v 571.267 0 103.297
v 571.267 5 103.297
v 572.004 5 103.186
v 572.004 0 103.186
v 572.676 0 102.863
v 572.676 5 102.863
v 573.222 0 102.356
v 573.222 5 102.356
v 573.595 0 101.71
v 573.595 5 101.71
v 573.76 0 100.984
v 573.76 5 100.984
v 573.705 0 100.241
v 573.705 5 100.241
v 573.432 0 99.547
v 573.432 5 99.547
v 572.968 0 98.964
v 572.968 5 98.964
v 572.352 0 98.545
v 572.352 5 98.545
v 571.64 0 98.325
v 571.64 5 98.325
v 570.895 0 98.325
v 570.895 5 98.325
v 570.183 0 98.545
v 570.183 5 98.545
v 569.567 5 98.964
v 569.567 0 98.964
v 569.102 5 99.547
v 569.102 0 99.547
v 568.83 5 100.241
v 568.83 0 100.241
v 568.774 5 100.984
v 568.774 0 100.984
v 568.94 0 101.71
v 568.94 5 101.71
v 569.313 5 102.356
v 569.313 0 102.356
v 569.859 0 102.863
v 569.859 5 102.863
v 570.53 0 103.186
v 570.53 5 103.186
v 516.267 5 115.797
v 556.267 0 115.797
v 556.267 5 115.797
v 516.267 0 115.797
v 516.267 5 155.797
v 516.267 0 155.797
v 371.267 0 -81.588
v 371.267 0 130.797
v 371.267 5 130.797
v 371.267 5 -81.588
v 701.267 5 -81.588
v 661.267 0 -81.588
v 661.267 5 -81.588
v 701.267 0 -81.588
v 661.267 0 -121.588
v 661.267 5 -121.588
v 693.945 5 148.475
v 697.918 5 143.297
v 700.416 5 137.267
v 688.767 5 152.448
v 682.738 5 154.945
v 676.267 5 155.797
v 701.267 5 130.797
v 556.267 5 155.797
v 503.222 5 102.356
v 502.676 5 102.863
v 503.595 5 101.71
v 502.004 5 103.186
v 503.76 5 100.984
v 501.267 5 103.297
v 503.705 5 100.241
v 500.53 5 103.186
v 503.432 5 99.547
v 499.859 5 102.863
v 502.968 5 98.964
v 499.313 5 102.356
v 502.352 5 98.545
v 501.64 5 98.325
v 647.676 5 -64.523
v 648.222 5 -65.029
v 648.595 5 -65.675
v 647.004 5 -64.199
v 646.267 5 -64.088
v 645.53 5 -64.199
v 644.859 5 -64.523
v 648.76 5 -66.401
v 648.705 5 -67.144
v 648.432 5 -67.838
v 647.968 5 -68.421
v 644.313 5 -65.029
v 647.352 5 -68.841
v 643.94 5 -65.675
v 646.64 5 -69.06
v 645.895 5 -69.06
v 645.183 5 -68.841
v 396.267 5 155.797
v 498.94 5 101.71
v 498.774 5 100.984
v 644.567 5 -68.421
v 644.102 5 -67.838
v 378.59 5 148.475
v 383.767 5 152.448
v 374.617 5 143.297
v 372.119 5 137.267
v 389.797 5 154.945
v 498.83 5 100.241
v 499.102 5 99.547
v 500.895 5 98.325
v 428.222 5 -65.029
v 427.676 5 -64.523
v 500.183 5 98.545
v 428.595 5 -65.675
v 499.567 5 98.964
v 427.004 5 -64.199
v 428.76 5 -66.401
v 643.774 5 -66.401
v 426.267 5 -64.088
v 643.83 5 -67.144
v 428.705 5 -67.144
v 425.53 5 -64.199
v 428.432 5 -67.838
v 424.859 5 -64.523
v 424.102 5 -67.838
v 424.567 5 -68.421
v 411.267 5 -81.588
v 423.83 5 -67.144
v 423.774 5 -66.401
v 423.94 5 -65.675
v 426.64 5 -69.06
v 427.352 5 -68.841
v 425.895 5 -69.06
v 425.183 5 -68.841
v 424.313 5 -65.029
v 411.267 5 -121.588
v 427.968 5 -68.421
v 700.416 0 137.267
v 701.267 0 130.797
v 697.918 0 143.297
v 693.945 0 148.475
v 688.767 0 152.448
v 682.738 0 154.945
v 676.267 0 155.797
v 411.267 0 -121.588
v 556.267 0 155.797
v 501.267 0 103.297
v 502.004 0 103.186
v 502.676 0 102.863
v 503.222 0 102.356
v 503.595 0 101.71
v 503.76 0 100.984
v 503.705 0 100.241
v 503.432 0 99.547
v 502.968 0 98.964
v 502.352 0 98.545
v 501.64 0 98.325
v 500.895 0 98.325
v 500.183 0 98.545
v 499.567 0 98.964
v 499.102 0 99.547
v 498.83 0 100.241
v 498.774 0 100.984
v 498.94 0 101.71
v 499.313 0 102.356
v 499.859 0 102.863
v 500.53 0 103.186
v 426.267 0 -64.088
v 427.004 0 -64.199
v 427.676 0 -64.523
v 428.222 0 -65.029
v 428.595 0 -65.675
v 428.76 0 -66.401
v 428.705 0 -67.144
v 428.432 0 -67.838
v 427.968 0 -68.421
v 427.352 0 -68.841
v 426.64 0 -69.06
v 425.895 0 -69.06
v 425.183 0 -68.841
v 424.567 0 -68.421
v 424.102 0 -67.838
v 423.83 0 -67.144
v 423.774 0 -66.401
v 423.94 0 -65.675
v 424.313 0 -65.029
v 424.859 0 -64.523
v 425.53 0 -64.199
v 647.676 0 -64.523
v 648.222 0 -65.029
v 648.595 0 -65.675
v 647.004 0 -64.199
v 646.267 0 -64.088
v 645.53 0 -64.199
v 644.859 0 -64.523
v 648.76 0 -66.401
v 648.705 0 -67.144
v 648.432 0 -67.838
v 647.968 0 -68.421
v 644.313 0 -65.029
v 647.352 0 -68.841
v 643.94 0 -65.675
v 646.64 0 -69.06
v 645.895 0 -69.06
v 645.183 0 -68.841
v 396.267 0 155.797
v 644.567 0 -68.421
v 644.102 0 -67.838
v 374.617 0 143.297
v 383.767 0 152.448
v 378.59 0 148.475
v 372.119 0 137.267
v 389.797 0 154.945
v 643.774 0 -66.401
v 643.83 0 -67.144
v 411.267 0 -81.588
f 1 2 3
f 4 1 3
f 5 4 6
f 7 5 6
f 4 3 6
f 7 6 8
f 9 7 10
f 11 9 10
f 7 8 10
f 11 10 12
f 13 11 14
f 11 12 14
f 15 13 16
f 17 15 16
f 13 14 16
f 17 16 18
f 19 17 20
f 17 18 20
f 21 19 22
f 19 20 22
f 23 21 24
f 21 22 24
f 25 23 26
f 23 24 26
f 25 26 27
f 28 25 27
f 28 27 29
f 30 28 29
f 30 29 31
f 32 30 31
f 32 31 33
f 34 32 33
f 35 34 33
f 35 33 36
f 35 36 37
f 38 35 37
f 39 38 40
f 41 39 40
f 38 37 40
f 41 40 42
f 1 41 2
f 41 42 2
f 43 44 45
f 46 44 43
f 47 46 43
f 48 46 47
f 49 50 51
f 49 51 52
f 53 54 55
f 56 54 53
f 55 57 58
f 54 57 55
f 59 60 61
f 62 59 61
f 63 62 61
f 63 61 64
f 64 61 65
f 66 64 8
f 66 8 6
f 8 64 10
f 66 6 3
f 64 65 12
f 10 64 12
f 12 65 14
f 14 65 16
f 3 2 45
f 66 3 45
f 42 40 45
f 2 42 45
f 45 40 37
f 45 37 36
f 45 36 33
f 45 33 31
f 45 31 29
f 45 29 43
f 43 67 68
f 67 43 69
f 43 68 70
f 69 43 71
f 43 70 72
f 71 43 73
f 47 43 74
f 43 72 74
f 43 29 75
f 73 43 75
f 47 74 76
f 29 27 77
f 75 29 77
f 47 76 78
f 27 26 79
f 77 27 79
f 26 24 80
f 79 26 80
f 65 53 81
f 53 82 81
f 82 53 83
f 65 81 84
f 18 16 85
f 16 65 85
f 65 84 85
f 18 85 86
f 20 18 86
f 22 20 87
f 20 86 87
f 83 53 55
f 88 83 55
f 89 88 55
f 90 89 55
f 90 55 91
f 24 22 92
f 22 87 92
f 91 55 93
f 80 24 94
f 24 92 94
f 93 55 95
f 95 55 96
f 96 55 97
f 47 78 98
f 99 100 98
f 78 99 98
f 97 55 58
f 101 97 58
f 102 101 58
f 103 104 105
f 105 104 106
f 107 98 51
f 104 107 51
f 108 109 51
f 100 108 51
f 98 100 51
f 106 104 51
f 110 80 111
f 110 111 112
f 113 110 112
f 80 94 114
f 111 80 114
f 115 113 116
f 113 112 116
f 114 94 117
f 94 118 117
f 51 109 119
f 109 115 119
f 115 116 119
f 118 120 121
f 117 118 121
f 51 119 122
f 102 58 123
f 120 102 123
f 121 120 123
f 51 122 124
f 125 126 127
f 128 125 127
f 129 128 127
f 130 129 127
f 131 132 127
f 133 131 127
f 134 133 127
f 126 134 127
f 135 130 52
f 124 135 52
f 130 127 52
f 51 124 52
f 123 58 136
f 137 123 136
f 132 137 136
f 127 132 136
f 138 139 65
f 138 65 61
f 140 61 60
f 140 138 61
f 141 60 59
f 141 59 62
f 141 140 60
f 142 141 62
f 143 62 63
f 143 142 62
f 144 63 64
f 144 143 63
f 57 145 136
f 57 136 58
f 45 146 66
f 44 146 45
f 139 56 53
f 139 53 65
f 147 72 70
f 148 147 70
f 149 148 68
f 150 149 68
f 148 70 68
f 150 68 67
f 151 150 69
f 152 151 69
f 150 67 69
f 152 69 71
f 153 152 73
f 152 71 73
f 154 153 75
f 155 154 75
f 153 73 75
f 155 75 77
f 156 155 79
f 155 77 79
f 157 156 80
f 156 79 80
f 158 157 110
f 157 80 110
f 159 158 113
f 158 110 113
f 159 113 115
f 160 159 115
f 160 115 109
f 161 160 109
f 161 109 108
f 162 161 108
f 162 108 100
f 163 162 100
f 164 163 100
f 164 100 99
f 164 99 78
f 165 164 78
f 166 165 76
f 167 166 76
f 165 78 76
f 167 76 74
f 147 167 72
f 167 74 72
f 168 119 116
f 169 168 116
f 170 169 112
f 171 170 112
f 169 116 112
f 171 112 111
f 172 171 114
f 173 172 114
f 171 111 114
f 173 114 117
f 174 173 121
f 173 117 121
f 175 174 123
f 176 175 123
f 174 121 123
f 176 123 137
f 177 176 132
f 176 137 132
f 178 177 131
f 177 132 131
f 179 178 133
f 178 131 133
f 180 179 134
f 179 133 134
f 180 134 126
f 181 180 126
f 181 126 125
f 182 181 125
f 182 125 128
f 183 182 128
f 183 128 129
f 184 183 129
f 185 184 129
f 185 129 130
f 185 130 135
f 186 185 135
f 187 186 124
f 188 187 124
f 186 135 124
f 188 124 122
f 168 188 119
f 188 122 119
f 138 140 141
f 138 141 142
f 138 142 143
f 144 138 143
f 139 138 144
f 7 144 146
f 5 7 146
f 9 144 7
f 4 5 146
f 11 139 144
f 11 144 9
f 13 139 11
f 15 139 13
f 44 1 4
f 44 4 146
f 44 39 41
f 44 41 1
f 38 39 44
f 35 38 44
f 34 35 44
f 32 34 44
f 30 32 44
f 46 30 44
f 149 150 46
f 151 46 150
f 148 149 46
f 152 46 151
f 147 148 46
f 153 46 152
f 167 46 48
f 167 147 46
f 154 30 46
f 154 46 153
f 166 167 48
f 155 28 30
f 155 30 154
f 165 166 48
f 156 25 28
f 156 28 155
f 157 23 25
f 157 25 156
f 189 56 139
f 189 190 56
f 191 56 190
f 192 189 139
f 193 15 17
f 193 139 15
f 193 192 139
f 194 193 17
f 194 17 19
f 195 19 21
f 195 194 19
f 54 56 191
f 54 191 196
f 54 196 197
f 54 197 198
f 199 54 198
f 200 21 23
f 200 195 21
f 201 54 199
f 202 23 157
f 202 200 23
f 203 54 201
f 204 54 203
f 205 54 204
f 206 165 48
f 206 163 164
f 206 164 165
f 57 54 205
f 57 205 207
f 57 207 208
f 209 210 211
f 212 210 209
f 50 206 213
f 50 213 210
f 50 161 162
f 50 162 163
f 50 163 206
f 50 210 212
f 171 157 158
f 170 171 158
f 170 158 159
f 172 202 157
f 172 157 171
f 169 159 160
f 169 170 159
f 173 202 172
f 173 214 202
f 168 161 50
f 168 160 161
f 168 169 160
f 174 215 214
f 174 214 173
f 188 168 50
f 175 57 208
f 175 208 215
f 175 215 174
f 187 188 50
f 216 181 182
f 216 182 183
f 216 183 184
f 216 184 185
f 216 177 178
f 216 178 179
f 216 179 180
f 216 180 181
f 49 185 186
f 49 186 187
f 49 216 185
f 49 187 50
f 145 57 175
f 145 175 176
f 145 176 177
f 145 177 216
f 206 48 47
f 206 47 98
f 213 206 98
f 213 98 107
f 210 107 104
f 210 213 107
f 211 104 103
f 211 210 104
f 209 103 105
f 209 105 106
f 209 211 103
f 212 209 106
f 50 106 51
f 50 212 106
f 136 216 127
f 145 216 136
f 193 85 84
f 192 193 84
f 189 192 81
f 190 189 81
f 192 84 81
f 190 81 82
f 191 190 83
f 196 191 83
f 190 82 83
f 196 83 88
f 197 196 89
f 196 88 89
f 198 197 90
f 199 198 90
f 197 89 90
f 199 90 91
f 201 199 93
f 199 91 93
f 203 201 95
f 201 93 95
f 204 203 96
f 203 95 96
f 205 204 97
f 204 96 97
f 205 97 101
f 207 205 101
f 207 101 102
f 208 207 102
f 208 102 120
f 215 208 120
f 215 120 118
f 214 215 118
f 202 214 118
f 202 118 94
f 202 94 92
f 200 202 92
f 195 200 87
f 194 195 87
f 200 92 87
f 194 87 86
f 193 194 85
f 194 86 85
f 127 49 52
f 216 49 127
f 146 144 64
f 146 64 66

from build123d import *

# Parameters (mm, degrees)
RESSALTO_EXTRUS_O4_DEPTH = 5
ESBO_O2_R                = 2.5
CORTE_EXTRUS_O1_DEPTH    = 5


with BuildPart() as part:
    # Esboço1 → Ressalto-extrusão4 (new body)
    with BuildSketch(Plane(origin=(0, 0, 0), x_dir=(1, 0, 0), z_dir=(0, 1, 0))):
        with BuildLine():
            Line((516.267355398, -155.796995794), (396.267355398, -155.796995794))
            ThreePointArc((396.267355398, -155.796995794), (378.589685869, -148.474665324), (371.267355398, -130.796995794))
            Line((371.267355398, -130.796995794), (371.267355398, 81.588187759))
            Line((371.267355398, 81.588187759), (411.267355398, 81.588187759))
            Line((411.267355398, 81.588187759), (411.267355398, 121.588187759))
            Line((411.267355398, 121.588187759), (661.267355398, 121.588187759))
            Line((661.267355398, 121.588187759), (661.267355398, 81.588187759))
            Line((661.267355398, 81.588187759), (701.267355398, 81.588187759))
            Line((701.267355398, 81.588187759), (701.267355398, -130.796995794))
            ThreePointArc((701.267355398, -130.796995794), (693.945024928, -148.474665324), (676.267355398, -155.796995794))
            Line((676.267355398, -155.796995794), (556.267355398, -155.796995794))
            Line((556.267355398, -155.796995794), (556.267355398, -115.796995794))
            Line((556.267355398, -115.796995794), (516.267355398, -115.796995794))
            Line((516.267355398, -115.796995794), (516.267355398, -155.796995794))
        make_face()
    extrude(amount=RESSALTO_EXTRUS_O4_DEPTH)

    # Esboço2 → Corte-extrusão1 (cut)
    with BuildSketch(Plane(origin=(0, 5, 0), x_dir=(1, 0, 0), z_dir=(0, 1, 0))):
        with Locations(Location((571.267355398, -100.796995794, 0), (0, 0, 270))):
            Circle(ESBO_O2_R)
        with Locations(Location((501.267355398, -100.796995794, 0), (0, 0, 270))):
            Circle(ESBO_O2_R)
        with Locations(Location((646.267355398, 66.588187759, 0), (0, 0, 270))):
            Circle(ESBO_O2_R)
        with Locations(Location((426.267355398, 66.588187759, 0), (0, 0, 270))):
            Circle(ESBO_O2_R)
    extrude(amount=-CORTE_EXTRUS_O1_DEPTH, mode=Mode.SUBTRACT)


solid = part.part
